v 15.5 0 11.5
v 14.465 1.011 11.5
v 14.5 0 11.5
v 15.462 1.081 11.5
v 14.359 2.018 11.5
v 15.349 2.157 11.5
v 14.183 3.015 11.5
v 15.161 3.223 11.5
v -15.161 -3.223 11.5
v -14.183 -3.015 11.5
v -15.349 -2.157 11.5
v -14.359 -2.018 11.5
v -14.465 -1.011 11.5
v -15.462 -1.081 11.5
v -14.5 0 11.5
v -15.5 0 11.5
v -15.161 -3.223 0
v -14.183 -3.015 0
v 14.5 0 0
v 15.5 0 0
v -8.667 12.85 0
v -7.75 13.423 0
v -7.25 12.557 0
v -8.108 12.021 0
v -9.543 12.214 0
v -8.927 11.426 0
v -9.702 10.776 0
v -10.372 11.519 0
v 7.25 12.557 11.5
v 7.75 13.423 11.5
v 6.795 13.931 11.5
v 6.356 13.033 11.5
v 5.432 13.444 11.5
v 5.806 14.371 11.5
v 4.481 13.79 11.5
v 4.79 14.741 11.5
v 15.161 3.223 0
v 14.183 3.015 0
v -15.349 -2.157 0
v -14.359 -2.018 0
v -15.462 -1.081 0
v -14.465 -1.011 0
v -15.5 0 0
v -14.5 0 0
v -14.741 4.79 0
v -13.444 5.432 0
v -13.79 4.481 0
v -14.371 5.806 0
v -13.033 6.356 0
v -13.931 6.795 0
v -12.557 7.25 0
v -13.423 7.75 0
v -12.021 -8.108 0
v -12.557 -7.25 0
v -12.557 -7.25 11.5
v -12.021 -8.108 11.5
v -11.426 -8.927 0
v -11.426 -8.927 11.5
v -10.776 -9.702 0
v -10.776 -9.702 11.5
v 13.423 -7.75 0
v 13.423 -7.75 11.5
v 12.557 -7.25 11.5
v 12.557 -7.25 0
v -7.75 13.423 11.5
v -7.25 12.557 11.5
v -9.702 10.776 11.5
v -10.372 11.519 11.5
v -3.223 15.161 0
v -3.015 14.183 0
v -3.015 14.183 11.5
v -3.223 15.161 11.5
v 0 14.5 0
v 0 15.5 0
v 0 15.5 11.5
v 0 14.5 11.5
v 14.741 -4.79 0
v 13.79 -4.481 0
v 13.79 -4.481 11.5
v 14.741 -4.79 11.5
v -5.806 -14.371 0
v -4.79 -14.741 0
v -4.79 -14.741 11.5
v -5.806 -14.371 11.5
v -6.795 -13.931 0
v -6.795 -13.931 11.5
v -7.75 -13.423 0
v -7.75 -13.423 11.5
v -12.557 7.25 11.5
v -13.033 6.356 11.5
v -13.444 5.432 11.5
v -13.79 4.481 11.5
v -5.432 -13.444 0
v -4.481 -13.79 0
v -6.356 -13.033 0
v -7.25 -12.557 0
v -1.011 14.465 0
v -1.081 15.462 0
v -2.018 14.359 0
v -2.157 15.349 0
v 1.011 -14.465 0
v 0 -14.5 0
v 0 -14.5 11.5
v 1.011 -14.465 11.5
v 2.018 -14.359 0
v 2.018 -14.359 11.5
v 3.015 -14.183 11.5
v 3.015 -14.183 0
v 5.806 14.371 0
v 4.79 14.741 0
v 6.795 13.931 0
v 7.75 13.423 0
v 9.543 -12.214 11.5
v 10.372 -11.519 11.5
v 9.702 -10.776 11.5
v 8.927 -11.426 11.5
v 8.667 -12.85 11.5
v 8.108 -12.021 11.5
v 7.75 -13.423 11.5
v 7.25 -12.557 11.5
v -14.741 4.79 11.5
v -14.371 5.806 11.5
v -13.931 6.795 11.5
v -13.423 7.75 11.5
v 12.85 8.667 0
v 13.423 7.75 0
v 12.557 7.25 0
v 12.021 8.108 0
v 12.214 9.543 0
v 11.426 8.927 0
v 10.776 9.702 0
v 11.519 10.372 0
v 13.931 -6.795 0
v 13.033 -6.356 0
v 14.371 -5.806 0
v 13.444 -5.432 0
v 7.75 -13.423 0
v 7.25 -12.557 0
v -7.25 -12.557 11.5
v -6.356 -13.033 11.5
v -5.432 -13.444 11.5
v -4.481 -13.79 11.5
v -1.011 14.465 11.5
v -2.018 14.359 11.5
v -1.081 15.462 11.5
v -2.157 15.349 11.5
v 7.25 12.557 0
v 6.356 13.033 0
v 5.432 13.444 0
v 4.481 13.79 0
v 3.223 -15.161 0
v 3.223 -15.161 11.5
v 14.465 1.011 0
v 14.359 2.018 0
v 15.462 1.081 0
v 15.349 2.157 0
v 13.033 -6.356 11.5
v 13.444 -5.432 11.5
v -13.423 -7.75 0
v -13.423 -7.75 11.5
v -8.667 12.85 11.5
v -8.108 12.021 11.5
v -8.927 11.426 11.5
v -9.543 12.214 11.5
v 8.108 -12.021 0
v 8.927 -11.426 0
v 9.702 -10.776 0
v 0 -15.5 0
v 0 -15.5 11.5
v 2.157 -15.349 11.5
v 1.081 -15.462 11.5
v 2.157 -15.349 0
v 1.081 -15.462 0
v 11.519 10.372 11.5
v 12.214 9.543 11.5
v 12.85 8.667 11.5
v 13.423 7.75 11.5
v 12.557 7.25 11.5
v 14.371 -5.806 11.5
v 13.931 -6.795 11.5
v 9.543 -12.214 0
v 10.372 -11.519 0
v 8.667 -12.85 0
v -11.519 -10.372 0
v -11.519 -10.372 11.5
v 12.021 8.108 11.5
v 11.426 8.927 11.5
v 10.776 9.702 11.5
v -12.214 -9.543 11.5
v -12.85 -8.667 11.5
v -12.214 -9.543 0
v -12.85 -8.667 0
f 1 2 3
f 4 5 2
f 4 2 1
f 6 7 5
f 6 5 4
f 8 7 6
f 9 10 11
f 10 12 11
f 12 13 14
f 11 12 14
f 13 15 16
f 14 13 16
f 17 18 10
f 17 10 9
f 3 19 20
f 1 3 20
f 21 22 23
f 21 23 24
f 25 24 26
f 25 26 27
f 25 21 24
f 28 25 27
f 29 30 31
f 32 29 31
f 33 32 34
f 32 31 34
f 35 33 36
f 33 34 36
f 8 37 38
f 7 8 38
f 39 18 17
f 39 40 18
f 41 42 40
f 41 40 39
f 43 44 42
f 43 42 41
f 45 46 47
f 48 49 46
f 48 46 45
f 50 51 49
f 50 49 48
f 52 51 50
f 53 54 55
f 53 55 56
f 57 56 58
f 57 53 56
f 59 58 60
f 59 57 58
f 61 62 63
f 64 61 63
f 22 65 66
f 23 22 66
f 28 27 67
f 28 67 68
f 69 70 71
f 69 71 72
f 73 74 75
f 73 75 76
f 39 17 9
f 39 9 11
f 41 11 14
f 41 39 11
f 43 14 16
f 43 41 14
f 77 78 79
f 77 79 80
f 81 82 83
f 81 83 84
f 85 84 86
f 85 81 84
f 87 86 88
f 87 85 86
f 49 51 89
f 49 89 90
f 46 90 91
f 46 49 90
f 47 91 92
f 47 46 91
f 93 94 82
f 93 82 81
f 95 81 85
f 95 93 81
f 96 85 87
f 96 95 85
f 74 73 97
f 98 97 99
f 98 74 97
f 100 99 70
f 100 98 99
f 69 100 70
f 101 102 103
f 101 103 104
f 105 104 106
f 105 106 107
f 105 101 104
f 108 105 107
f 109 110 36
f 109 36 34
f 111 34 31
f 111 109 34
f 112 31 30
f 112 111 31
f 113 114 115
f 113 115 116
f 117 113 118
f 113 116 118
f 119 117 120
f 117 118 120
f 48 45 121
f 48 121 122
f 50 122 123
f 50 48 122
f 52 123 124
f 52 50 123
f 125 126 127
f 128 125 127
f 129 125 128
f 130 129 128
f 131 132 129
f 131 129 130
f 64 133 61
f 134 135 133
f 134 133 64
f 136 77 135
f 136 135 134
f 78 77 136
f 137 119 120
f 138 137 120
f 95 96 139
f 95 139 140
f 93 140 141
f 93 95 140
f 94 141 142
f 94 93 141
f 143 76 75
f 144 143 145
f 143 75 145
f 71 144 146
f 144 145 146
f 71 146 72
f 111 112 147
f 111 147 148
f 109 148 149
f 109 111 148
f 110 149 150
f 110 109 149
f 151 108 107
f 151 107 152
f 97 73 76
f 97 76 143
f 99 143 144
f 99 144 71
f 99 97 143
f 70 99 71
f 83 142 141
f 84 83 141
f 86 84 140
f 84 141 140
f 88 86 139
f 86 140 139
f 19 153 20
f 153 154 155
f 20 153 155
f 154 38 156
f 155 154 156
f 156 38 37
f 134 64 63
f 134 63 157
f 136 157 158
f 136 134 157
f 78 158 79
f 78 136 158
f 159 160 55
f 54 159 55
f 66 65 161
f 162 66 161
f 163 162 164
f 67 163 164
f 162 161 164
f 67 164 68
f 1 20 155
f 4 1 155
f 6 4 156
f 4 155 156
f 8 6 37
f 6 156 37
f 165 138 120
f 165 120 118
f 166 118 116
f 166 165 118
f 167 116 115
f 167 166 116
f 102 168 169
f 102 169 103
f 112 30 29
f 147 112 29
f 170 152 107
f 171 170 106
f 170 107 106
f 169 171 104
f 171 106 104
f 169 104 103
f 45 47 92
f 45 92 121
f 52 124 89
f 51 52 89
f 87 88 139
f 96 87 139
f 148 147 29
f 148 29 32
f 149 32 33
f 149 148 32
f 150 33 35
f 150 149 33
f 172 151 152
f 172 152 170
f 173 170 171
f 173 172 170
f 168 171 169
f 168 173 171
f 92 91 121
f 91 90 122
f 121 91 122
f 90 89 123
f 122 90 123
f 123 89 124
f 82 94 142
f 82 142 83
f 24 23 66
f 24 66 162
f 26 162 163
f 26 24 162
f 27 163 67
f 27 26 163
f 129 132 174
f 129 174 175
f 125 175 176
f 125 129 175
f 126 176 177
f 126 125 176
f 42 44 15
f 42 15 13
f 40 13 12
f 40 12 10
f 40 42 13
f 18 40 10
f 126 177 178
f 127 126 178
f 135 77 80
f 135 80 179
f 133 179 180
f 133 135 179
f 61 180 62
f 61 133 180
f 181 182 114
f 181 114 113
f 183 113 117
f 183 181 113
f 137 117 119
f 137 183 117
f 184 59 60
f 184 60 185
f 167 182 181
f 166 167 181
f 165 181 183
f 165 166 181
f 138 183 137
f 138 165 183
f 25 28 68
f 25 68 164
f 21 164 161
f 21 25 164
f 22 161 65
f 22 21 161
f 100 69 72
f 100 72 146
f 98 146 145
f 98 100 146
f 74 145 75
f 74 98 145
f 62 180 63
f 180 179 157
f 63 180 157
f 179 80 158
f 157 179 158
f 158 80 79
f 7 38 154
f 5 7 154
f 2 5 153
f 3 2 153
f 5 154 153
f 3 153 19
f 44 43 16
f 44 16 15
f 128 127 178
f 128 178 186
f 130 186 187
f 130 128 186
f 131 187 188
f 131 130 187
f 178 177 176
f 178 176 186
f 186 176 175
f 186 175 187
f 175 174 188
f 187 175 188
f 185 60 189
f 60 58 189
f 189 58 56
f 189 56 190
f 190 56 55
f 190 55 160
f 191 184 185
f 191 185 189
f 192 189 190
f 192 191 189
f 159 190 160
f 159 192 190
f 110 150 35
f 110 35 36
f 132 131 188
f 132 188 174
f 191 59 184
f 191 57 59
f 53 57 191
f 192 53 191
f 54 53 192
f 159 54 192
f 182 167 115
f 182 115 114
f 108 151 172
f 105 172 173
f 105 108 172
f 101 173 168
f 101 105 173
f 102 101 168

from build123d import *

# Parameters (mm, degrees)
BOSS_EXTRU_1_DEPTH    = 11.5
BOSS_EXTRU_1_2_DEPTH  = 11.5
BOSS_EXTRU_1_3_DEPTH  = 11.5
BOSS_EXTRU_1_4_DEPTH  = 11.5
BOSS_EXTRU_1_5_DEPTH  = 11.5
BOSS_EXTRU_1_6_DEPTH  = 11.5
BOSS_EXTRU_1_7_DEPTH  = 11.5
BOSS_EXTRU_1_8_DEPTH  = 11.5
BOSS_EXTRU_1_9_DEPTH  = 11.5
BOSS_EXTRU_1_10_DEPTH = 11.5
BOSS_EXTRU_1_11_DEPTH = 11.5
BOSS_EXTRU_1_12_DEPTH = 11.5


with BuildPart() as part:
    # Esquisse1 → Boss.-Extru.1 (new body)
    with BuildSketch(Plane.XY):
        with BuildLine():
            Line((14.5, 0), (15.5, 0))
            ThreePointArc((15.5, 0), (15.415089378, 1.620191181), (15.161287811, 3.222631208))
            Line((15.161287811, 3.222631208), (14.183140211, 3.014719517))
            ThreePointArc((14.183140211, 3.014719517), (14.420567483, 1.515662717), (14.5, 0))
        make_face()
    extrude(amount=BOSS_EXTRU_1_DEPTH)


with BuildPart() as body_2:
    # Esquisse1 → Boss.-Extru.1 2 (new body)
    with BuildSketch(Plane.XY):
        with BuildLine():
            Line((13.790319486, -4.480746418), (14.741376003, -4.789763413))
            ThreePointArc((14.741376003, -4.789763413), (14.159954593, -6.304417968), (13.423393759, -7.75))
            Line((13.423393759, -7.75), (12.557368355, -7.25))
            ThreePointArc((12.557368355, -7.25), (13.246409136, -5.897681325), (13.790319486, -4.480746418))
        make_face()
    extrude(amount=BOSS_EXTRU_1_2_DEPTH)


with BuildPart() as body_3:
    # Esquisse1 → Boss.-Extru.1 3 (new body)
    with BuildSketch(Plane.XY):
        with BuildLine():
            Line((9.702393792, -10.775599969), (10.371524399, -11.518744795))
            ThreePointArc((10.371524399, -11.518744795), (9.110671411, -12.539763413), (7.75, -13.423393759))
            Line((7.75, -13.423393759), (7.25, -12.557368355))
            ThreePointArc((7.25, -12.557368355), (8.522886158, -11.730746418), (9.702393792, -10.775599969))
        make_face()
    extrude(amount=BOSS_EXTRU_1_3_DEPTH)


with BuildPart() as body_4:
    # Esquisse1 → Boss.-Extru.1 4 (new body)
    with BuildSketch(Plane.XY):
        with BuildLine():
            Line((3.014719517, -14.183140211), (3.222631208, -15.161287811))
            ThreePointArc((3.222631208, -15.161287811), (1.620191181, -15.415089378), (0, -15.5))
            Line((0, -15.5), (0, -14.5))
            ThreePointArc((0, -14.5), (1.515662717, -14.420567483), (3.014719517, -14.183140211))
        make_face()
    extrude(amount=BOSS_EXTRU_1_4_DEPTH)


with BuildPart() as body_5:
    # Esquisse1 → Boss.-Extru.1 5 (new body)
    with BuildSketch(Plane.XY):
        with BuildLine():
            Line((-4.480746418, -13.790319486), (-4.789763413, -14.741376003))
            ThreePointArc((-4.789763413, -14.741376003), (-6.304417968, -14.159954593), (-7.75, -13.423393759))
            Line((-7.75, -13.423393759), (-7.25, -12.557368355))
            ThreePointArc((-7.25, -12.557368355), (-5.897681325, -13.246409136), (-4.480746418, -13.790319486))
        make_face()
    extrude(amount=BOSS_EXTRU_1_5_DEPTH)


with BuildPart() as body_6:
    # Esquisse1 → Boss.-Extru.1 6 (new body)
    with BuildSketch(Plane.XY):
        with BuildLine():
            Line((-10.775599969, -9.702393792), (-11.518744795, -10.371524399))
            ThreePointArc((-11.518744795, -10.371524399), (-12.539763413, -9.110671411), (-13.423393759, -7.75))
            Line((-13.423393759, -7.75), (-12.557368355, -7.25))
            ThreePointArc((-12.557368355, -7.25), (-11.730746418, -8.522886158), (-10.775599969, -9.702393792))
        make_face()
    extrude(amount=BOSS_EXTRU_1_6_DEPTH)


with BuildPart() as body_7:
    # Esquisse1 → Boss.-Extru.1 7 (new body)
    with BuildSketch(Plane.XY):
        with BuildLine():
            Line((-14.183140211, -3.014719517), (-15.161287811, -3.222631208))
            ThreePointArc((-15.161287811, -3.222631208), (-15.415089378, -1.620191181), (-15.5, 0))
            Line((-15.5, 0), (-14.5, 0))
            ThreePointArc((-14.5, 0), (-14.420567483, -1.515662717), (-14.183140211, -3.014719517))
        make_face()
    extrude(amount=BOSS_EXTRU_1_7_DEPTH)


with BuildPart() as body_8:
    # Esquisse1 → Boss.-Extru.1 8 (new body)
    with BuildSketch(Plane.XY):
        with BuildLine():
            Line((-13.790319486, 4.480746418), (-14.741376003, 4.789763413))
            ThreePointArc((-14.741376003, 4.789763413), (-14.159954593, 6.304417968), (-13.423393759, 7.75))
            Line((-13.423393759, 7.75), (-12.557368355, 7.25))
            ThreePointArc((-12.557368355, 7.25), (-13.246409136, 5.897681325), (-13.790319486, 4.480746418))
        make_face()
    extrude(amount=BOSS_EXTRU_1_8_DEPTH)


with BuildPart() as body_9:
    # Esquisse1 → Boss.-Extru.1 9 (new body)
    with BuildSketch(Plane.XY):
        with BuildLine():
            Line((-9.702393792, 10.775599969), (-10.371524399, 11.518744795))
            ThreePointArc((-10.371524399, 11.518744795), (-9.110671411, 12.539763413), (-7.75, 13.423393759))
            Line((-7.75, 13.423393759), (-7.25, 12.557368355))
            ThreePointArc((-7.25, 12.557368355), (-8.522886158, 11.730746418), (-9.702393792, 10.775599969))
        make_face()
    extrude(amount=BOSS_EXTRU_1_9_DEPTH)


with BuildPart() as body_10:
    # Esquisse1 → Boss.-Extru.1 10 (new body)
    with BuildSketch(Plane.XY):
        with BuildLine():
            Line((-3.014719517, 14.183140211), (-3.222631208, 15.161287811))
            ThreePointArc((-3.222631208, 15.161287811), (-1.620191181, 15.415089378), (0, 15.5))
            Line((0, 15.5), (0, 14.5))
            ThreePointArc((0, 14.5), (-1.515662717, 14.420567483), (-3.014719517, 14.183140211))
        make_face()
    extrude(amount=BOSS_EXTRU_1_10_DEPTH)


with BuildPart() as body_11:
    # Esquisse1 → Boss.-Extru.1 11 (new body)
    with BuildSketch(Plane.XY):
        with BuildLine():
            Line((4.480746418, 13.790319486), (4.789763413, 14.741376003))
            ThreePointArc((4.789763413, 14.741376003), (6.304417968, 14.159954593), (7.75, 13.423393759))
            Line((7.75, 13.423393759), (7.25, 12.557368355))
            ThreePointArc((7.25, 12.557368355), (5.897681325, 13.246409136), (4.480746418, 13.790319486))
        make_face()
    extrude(amount=BOSS_EXTRU_1_11_DEPTH)


with BuildPart() as body_12:
    # Esquisse1 → Boss.-Extru.1 12 (new body)
    with BuildSketch(Plane.XY):
        with BuildLine():
            Line((10.775599969, 9.702393792), (11.518744795, 10.371524399))
            ThreePointArc((11.518744795, 10.371524399), (12.539763413, 9.110671411), (13.423393759, 7.75))
            Line((13.423393759, 7.75), (12.557368355, 7.25))
            ThreePointArc((12.557368355, 7.25), (11.730746418, 8.522886158), (10.775599969, 9.702393792))
        make_face()
    extrude(amount=BOSS_EXTRU_1_12_DEPTH)


solid = Compound([part.part, body_2.part, body_3.part, body_4.part, body_5.part, body_6.part, body_7.part, body_8.part, body_9.part, body_10.part, body_11.part, body_12.part])
